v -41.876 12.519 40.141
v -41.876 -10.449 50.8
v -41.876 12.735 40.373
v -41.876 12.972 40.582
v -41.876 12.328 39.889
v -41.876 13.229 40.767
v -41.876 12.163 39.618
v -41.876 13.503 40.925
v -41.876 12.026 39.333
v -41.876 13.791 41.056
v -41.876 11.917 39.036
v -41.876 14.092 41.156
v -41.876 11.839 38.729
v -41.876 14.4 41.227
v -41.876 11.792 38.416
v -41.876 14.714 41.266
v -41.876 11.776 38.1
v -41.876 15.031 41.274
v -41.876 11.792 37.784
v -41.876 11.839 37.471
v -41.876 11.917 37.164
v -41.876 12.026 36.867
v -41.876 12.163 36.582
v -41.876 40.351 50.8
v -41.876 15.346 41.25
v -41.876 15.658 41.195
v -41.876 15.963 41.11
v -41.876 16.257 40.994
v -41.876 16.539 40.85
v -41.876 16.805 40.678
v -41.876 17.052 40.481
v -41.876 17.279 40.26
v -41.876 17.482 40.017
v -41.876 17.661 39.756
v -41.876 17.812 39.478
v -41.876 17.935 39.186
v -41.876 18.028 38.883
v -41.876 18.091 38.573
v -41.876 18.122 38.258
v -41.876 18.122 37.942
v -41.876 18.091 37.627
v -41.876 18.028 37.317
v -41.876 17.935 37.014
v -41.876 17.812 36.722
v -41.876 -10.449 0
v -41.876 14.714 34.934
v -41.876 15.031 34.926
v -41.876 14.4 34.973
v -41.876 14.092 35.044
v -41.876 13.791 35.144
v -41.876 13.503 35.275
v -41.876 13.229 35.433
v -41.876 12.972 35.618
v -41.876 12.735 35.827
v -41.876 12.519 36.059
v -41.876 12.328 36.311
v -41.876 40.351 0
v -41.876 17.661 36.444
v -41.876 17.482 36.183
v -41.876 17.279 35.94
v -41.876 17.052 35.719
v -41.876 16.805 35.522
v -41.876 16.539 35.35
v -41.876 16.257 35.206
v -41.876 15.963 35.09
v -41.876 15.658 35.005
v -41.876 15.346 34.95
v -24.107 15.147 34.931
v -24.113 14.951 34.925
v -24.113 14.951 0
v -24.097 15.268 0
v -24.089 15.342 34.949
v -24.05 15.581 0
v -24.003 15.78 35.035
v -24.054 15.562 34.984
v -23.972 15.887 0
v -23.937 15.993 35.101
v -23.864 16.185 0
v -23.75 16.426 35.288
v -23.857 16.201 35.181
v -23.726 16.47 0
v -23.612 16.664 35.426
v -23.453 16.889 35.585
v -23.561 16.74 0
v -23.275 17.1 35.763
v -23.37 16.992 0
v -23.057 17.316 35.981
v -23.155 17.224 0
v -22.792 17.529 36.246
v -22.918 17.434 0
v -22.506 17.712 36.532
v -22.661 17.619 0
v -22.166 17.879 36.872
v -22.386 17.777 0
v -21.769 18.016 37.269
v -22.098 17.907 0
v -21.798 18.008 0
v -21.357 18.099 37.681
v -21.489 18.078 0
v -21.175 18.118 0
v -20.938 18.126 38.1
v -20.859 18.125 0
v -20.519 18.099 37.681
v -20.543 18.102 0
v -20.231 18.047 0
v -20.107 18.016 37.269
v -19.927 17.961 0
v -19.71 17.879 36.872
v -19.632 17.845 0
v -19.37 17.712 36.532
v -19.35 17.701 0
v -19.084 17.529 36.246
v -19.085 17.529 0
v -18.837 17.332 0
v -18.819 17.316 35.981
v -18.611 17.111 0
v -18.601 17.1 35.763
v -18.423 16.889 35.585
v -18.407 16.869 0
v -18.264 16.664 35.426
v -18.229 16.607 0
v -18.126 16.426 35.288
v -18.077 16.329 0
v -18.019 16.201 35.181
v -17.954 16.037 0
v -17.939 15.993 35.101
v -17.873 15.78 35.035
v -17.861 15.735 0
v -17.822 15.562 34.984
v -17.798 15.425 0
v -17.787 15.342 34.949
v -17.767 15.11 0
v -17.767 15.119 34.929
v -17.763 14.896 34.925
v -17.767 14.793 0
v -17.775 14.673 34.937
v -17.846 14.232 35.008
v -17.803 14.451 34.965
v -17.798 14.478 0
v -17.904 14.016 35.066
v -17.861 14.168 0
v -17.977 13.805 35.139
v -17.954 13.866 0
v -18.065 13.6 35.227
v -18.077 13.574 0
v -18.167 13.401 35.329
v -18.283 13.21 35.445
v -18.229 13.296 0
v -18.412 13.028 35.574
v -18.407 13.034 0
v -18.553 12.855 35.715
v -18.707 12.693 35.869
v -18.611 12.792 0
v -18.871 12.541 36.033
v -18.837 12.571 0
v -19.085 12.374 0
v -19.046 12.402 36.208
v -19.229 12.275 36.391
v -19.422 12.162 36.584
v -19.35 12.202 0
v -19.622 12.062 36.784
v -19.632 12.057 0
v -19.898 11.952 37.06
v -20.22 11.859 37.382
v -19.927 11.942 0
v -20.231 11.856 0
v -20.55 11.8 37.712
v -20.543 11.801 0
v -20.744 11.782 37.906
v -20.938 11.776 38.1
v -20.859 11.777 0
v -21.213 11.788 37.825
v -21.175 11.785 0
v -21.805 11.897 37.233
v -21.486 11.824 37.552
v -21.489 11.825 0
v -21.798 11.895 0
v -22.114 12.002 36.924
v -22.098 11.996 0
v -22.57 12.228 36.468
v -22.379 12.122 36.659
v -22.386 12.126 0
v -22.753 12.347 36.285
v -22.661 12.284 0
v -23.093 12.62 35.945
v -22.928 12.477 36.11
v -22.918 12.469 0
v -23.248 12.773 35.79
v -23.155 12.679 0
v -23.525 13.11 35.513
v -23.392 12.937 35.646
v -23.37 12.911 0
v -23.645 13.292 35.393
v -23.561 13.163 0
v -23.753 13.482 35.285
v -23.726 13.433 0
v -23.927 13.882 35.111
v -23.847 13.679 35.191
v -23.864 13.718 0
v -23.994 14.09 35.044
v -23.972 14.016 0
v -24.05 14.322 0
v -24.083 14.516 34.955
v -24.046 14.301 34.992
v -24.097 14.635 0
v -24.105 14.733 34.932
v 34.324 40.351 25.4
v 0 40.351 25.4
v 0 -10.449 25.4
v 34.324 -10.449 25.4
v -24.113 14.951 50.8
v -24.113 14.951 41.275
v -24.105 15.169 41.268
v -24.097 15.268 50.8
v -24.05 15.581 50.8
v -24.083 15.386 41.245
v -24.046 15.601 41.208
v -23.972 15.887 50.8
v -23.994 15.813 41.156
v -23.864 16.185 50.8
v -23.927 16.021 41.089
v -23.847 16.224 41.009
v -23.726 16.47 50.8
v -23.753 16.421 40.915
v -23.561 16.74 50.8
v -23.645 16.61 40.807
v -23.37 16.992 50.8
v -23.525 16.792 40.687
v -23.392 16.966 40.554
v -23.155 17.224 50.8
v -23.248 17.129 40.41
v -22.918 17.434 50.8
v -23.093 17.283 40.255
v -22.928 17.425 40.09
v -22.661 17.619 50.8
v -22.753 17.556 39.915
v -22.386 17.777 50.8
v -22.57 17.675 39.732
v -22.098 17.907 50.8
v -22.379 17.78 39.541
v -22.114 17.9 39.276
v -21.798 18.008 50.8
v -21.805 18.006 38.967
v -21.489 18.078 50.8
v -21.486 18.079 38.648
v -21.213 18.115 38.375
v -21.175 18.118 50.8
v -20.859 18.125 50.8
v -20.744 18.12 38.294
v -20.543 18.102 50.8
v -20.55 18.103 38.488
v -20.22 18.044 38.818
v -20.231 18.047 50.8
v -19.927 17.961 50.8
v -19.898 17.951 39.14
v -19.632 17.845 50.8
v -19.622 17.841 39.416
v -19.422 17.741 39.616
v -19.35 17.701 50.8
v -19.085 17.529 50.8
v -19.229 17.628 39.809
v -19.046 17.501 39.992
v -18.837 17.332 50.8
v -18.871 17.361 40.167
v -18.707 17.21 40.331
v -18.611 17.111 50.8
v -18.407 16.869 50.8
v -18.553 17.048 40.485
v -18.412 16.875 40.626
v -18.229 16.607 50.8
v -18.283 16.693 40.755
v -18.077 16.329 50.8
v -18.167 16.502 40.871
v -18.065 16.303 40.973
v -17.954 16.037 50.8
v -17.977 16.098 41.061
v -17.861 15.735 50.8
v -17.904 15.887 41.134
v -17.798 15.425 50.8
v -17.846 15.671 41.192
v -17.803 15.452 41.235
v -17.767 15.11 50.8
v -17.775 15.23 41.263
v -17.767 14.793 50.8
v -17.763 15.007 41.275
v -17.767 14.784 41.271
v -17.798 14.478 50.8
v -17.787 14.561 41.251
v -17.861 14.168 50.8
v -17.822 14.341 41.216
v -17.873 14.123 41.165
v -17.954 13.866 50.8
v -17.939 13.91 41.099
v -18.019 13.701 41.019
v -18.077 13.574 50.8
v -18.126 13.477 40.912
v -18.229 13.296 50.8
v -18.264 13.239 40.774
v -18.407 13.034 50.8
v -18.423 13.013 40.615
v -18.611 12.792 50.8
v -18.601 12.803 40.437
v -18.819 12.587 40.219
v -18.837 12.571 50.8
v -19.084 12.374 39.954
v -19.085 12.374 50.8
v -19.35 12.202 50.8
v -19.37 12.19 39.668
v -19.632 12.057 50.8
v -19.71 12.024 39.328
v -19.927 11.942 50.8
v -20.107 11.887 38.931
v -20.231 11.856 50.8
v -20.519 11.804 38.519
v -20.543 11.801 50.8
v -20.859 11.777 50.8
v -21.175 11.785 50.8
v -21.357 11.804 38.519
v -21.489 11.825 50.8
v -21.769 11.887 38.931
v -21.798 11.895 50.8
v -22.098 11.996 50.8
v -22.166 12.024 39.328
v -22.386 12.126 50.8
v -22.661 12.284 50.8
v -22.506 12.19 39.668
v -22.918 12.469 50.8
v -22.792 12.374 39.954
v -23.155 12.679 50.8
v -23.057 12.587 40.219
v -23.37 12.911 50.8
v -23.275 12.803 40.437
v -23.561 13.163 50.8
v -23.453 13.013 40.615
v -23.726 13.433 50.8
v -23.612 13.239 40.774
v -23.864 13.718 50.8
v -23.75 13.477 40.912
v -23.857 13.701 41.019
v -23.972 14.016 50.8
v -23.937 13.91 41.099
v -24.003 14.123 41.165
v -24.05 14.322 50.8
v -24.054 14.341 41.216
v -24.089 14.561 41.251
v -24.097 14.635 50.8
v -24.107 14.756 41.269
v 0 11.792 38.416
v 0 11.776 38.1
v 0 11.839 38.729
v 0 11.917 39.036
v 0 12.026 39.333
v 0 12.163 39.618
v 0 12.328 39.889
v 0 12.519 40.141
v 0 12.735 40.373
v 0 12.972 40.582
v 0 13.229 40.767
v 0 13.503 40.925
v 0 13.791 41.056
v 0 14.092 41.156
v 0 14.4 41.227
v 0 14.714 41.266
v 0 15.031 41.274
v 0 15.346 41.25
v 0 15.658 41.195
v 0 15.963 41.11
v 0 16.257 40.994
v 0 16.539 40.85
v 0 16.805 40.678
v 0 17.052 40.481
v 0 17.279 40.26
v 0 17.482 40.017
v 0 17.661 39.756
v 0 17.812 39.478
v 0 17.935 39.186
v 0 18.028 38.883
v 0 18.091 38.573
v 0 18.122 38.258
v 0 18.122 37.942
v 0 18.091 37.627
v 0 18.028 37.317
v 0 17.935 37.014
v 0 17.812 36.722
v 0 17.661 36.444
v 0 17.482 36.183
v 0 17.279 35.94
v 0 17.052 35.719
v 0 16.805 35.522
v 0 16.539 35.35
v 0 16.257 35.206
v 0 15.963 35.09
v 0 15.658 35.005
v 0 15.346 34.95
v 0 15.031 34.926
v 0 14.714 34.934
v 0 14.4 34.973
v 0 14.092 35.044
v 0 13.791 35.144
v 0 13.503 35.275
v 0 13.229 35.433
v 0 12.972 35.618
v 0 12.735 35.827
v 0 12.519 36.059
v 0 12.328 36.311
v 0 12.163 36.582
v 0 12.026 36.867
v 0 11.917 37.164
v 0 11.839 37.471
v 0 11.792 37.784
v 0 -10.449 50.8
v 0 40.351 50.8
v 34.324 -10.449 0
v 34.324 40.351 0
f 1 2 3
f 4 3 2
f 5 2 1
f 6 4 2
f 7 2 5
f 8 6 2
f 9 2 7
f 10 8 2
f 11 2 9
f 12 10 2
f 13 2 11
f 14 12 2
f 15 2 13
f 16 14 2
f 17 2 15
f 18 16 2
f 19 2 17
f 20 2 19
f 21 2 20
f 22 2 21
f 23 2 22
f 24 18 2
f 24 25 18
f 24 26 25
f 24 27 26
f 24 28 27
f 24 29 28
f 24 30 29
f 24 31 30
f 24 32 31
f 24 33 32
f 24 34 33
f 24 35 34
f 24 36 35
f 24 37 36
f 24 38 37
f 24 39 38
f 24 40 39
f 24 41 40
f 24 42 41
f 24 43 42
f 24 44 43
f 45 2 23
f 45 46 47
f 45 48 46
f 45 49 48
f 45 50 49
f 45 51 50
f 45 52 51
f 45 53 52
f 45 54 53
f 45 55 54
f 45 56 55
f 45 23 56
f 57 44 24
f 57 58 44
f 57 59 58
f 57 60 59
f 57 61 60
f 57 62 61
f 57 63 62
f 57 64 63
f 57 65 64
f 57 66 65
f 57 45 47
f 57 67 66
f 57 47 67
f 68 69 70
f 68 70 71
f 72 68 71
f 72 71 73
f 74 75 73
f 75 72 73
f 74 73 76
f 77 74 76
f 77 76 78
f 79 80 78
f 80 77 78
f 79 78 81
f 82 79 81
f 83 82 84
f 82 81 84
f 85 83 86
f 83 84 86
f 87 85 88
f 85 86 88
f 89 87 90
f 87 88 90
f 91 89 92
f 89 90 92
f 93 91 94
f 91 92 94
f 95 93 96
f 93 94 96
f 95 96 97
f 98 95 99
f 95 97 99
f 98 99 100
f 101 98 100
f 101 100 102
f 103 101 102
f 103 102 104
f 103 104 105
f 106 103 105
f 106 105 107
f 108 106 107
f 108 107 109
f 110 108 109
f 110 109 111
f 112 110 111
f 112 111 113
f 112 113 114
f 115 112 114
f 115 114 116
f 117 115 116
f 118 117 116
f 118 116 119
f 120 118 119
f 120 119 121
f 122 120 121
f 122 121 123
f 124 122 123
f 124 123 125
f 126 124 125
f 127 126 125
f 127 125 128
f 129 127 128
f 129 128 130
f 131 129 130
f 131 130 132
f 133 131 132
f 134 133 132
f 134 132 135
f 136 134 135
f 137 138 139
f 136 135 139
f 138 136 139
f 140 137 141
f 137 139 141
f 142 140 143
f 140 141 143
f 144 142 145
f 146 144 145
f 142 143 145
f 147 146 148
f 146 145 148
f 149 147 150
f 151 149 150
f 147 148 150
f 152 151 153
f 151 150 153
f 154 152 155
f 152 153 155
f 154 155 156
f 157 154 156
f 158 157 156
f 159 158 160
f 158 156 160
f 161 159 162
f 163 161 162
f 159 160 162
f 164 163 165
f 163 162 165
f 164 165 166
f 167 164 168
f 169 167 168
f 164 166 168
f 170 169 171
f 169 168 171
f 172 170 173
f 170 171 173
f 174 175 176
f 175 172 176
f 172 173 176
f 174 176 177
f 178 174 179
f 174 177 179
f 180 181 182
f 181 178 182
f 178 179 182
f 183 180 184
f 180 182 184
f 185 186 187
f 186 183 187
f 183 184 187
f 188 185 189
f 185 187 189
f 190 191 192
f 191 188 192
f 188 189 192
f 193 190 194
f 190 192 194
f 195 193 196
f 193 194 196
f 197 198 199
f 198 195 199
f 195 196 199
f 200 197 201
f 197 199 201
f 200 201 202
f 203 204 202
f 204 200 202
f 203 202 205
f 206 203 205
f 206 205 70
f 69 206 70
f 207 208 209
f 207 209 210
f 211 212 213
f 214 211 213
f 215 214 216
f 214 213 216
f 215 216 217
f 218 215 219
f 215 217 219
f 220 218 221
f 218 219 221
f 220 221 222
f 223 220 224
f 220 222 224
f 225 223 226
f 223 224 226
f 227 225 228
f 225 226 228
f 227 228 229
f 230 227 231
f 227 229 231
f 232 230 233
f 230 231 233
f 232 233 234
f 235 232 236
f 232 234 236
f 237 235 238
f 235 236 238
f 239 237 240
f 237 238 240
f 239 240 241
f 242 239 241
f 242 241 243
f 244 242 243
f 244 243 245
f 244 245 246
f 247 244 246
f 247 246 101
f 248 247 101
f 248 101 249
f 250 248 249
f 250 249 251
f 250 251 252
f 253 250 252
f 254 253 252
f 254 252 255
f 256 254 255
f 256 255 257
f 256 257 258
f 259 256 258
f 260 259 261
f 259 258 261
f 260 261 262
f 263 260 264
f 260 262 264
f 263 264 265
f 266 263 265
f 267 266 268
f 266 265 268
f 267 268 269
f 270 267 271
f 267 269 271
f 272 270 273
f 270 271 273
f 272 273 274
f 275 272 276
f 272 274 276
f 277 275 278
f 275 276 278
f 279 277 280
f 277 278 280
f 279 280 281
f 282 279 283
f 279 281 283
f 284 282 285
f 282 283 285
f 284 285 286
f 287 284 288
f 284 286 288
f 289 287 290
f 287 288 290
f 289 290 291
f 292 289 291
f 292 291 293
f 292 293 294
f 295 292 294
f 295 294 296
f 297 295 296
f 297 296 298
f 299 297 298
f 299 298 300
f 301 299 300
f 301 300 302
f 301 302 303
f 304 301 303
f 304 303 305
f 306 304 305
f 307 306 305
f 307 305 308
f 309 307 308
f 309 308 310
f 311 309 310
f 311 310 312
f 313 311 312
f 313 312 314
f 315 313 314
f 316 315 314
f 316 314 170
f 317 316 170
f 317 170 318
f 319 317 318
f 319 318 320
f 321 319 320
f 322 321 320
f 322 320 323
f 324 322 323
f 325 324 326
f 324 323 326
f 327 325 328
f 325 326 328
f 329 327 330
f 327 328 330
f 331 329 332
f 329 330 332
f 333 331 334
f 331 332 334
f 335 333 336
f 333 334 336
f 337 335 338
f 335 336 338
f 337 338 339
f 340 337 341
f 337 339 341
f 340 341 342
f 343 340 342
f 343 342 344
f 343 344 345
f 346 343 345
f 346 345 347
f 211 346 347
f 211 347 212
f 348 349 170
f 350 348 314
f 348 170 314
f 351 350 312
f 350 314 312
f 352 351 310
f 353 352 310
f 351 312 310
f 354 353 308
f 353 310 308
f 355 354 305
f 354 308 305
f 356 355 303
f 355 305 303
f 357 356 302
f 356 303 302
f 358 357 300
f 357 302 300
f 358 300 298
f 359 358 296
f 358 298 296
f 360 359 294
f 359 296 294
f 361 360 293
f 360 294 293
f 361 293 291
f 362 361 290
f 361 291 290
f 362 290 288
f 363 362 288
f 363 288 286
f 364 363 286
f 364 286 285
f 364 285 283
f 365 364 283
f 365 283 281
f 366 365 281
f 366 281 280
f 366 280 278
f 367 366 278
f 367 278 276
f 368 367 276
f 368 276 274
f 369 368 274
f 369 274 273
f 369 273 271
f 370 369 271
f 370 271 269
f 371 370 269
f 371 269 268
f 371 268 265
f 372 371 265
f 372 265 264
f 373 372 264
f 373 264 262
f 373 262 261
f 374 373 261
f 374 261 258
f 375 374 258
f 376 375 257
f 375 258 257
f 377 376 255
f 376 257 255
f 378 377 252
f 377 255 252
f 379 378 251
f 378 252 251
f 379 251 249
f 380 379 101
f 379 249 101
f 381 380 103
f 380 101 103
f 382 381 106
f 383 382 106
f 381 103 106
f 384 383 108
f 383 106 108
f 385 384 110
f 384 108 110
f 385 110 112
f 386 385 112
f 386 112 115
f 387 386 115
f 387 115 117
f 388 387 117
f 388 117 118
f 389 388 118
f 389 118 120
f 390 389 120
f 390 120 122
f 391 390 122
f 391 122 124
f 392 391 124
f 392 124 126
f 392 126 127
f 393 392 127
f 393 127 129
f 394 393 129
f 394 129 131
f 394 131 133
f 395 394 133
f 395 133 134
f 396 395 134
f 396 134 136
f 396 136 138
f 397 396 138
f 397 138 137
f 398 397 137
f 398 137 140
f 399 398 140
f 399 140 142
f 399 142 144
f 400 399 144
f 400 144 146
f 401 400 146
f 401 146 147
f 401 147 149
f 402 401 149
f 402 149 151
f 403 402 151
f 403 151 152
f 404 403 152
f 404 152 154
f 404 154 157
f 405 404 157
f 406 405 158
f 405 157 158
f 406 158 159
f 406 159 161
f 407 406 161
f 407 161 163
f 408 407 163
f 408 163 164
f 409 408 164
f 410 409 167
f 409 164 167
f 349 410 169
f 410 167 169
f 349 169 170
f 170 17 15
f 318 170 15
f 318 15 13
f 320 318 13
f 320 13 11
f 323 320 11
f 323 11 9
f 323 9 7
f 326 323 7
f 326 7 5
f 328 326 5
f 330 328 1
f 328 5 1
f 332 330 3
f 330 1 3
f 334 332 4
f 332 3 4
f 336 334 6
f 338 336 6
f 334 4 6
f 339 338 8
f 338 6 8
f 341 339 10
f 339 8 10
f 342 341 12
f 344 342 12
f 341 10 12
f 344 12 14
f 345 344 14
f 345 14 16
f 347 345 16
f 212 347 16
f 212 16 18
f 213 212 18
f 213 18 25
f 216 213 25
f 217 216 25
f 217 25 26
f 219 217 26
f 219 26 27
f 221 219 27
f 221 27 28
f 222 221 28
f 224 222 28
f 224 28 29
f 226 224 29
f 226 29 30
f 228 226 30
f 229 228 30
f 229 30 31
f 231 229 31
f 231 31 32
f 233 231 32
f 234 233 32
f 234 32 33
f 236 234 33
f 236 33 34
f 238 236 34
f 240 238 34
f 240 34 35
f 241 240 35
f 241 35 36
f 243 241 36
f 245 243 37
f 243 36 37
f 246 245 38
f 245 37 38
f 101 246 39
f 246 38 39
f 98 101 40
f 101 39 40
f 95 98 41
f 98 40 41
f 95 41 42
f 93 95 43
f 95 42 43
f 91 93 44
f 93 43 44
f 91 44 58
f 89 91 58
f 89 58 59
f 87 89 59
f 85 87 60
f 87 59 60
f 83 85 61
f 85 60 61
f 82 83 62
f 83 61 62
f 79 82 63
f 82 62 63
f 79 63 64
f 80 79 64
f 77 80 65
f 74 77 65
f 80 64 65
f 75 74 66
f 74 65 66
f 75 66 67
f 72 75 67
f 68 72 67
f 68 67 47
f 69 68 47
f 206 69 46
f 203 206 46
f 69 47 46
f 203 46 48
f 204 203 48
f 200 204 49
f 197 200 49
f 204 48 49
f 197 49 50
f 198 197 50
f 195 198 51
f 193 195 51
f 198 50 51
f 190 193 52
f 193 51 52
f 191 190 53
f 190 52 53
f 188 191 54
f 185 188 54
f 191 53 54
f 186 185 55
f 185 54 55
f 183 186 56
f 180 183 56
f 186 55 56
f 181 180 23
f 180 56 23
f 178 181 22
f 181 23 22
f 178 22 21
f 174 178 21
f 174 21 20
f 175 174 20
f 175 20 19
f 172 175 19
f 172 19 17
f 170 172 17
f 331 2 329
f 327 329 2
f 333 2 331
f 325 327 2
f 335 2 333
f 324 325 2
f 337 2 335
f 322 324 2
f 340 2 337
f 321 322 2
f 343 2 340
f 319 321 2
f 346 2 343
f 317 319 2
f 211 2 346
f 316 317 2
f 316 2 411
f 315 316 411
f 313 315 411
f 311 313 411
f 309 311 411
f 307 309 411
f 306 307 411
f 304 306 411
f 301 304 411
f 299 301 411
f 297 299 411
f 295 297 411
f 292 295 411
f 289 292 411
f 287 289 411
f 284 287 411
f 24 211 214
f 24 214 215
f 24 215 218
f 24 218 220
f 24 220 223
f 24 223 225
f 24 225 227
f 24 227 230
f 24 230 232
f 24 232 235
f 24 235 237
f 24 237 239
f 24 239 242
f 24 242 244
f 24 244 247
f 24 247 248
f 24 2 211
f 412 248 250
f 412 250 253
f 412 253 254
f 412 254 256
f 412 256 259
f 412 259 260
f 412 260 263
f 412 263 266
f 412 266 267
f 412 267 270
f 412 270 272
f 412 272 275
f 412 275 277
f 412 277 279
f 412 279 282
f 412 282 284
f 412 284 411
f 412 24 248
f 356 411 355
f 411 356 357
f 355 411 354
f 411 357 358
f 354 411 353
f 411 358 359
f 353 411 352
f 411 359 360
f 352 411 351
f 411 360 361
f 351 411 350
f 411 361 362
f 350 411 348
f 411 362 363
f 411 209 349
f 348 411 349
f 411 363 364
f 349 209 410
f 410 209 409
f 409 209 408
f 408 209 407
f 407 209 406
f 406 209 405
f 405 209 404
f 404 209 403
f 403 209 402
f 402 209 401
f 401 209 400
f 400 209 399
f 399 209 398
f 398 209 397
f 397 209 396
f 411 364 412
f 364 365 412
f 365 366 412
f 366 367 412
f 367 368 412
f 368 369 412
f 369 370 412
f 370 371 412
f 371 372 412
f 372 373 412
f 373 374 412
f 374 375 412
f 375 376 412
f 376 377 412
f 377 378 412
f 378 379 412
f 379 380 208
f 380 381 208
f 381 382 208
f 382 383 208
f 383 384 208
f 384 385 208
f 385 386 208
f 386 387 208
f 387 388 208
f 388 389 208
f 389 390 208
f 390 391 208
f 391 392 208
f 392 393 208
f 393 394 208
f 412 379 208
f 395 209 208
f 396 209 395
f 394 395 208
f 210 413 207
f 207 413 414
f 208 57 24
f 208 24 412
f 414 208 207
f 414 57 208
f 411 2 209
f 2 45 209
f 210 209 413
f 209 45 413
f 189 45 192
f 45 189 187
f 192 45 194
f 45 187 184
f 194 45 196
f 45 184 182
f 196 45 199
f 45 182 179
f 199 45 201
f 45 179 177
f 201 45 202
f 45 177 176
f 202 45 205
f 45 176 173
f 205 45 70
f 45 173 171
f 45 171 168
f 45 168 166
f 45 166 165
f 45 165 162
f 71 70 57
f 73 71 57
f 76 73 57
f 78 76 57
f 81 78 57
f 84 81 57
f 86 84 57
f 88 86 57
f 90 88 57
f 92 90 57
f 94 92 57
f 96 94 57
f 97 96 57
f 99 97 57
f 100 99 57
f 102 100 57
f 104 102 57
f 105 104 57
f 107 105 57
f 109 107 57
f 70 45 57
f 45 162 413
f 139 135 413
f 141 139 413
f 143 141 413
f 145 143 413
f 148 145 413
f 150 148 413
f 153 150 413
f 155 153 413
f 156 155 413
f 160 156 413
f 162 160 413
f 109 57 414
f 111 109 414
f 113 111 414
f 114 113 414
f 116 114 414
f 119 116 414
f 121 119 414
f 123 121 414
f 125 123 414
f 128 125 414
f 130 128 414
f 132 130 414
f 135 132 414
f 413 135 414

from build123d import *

# Parameters (mm, degrees)
F0_W     = 76.2
F0_H     = 50.8
F1_DEPTH = 25.4
F2_W     = 41.875984
F2_H     = 50.8
F3_DEPTH = 25.4
F5_D     = 6.35
F7_D     = 6.35


with BuildPart() as f1:
    # F0 (on Top) → F1 (new body)
    with BuildSketch(Plane.XY):
        with Locations((-3.775984, 14.951435)):
            Rectangle(F0_W, F0_H)
    extrude(amount=F1_DEPTH)

    # F2 (on face) → F3 (join)
    with BuildSketch(Plane.XY.offset(25.4)):
        with Locations((-20.937992, 14.951435)):
            Rectangle(F2_W, F2_H)
    extrude(amount=F3_DEPTH)

    # F5 (through all)
    with Locations(Plane.YZ):
        with Locations((14.951435, 38.1)):
            Hole(F5_D / 2)

    # F7 (through all)
    with Locations(Plane.XY.offset(50.8)):
        with Locations((-20.937992, 14.951435)):
            Hole(F7_D / 2)


solid = f1.part
